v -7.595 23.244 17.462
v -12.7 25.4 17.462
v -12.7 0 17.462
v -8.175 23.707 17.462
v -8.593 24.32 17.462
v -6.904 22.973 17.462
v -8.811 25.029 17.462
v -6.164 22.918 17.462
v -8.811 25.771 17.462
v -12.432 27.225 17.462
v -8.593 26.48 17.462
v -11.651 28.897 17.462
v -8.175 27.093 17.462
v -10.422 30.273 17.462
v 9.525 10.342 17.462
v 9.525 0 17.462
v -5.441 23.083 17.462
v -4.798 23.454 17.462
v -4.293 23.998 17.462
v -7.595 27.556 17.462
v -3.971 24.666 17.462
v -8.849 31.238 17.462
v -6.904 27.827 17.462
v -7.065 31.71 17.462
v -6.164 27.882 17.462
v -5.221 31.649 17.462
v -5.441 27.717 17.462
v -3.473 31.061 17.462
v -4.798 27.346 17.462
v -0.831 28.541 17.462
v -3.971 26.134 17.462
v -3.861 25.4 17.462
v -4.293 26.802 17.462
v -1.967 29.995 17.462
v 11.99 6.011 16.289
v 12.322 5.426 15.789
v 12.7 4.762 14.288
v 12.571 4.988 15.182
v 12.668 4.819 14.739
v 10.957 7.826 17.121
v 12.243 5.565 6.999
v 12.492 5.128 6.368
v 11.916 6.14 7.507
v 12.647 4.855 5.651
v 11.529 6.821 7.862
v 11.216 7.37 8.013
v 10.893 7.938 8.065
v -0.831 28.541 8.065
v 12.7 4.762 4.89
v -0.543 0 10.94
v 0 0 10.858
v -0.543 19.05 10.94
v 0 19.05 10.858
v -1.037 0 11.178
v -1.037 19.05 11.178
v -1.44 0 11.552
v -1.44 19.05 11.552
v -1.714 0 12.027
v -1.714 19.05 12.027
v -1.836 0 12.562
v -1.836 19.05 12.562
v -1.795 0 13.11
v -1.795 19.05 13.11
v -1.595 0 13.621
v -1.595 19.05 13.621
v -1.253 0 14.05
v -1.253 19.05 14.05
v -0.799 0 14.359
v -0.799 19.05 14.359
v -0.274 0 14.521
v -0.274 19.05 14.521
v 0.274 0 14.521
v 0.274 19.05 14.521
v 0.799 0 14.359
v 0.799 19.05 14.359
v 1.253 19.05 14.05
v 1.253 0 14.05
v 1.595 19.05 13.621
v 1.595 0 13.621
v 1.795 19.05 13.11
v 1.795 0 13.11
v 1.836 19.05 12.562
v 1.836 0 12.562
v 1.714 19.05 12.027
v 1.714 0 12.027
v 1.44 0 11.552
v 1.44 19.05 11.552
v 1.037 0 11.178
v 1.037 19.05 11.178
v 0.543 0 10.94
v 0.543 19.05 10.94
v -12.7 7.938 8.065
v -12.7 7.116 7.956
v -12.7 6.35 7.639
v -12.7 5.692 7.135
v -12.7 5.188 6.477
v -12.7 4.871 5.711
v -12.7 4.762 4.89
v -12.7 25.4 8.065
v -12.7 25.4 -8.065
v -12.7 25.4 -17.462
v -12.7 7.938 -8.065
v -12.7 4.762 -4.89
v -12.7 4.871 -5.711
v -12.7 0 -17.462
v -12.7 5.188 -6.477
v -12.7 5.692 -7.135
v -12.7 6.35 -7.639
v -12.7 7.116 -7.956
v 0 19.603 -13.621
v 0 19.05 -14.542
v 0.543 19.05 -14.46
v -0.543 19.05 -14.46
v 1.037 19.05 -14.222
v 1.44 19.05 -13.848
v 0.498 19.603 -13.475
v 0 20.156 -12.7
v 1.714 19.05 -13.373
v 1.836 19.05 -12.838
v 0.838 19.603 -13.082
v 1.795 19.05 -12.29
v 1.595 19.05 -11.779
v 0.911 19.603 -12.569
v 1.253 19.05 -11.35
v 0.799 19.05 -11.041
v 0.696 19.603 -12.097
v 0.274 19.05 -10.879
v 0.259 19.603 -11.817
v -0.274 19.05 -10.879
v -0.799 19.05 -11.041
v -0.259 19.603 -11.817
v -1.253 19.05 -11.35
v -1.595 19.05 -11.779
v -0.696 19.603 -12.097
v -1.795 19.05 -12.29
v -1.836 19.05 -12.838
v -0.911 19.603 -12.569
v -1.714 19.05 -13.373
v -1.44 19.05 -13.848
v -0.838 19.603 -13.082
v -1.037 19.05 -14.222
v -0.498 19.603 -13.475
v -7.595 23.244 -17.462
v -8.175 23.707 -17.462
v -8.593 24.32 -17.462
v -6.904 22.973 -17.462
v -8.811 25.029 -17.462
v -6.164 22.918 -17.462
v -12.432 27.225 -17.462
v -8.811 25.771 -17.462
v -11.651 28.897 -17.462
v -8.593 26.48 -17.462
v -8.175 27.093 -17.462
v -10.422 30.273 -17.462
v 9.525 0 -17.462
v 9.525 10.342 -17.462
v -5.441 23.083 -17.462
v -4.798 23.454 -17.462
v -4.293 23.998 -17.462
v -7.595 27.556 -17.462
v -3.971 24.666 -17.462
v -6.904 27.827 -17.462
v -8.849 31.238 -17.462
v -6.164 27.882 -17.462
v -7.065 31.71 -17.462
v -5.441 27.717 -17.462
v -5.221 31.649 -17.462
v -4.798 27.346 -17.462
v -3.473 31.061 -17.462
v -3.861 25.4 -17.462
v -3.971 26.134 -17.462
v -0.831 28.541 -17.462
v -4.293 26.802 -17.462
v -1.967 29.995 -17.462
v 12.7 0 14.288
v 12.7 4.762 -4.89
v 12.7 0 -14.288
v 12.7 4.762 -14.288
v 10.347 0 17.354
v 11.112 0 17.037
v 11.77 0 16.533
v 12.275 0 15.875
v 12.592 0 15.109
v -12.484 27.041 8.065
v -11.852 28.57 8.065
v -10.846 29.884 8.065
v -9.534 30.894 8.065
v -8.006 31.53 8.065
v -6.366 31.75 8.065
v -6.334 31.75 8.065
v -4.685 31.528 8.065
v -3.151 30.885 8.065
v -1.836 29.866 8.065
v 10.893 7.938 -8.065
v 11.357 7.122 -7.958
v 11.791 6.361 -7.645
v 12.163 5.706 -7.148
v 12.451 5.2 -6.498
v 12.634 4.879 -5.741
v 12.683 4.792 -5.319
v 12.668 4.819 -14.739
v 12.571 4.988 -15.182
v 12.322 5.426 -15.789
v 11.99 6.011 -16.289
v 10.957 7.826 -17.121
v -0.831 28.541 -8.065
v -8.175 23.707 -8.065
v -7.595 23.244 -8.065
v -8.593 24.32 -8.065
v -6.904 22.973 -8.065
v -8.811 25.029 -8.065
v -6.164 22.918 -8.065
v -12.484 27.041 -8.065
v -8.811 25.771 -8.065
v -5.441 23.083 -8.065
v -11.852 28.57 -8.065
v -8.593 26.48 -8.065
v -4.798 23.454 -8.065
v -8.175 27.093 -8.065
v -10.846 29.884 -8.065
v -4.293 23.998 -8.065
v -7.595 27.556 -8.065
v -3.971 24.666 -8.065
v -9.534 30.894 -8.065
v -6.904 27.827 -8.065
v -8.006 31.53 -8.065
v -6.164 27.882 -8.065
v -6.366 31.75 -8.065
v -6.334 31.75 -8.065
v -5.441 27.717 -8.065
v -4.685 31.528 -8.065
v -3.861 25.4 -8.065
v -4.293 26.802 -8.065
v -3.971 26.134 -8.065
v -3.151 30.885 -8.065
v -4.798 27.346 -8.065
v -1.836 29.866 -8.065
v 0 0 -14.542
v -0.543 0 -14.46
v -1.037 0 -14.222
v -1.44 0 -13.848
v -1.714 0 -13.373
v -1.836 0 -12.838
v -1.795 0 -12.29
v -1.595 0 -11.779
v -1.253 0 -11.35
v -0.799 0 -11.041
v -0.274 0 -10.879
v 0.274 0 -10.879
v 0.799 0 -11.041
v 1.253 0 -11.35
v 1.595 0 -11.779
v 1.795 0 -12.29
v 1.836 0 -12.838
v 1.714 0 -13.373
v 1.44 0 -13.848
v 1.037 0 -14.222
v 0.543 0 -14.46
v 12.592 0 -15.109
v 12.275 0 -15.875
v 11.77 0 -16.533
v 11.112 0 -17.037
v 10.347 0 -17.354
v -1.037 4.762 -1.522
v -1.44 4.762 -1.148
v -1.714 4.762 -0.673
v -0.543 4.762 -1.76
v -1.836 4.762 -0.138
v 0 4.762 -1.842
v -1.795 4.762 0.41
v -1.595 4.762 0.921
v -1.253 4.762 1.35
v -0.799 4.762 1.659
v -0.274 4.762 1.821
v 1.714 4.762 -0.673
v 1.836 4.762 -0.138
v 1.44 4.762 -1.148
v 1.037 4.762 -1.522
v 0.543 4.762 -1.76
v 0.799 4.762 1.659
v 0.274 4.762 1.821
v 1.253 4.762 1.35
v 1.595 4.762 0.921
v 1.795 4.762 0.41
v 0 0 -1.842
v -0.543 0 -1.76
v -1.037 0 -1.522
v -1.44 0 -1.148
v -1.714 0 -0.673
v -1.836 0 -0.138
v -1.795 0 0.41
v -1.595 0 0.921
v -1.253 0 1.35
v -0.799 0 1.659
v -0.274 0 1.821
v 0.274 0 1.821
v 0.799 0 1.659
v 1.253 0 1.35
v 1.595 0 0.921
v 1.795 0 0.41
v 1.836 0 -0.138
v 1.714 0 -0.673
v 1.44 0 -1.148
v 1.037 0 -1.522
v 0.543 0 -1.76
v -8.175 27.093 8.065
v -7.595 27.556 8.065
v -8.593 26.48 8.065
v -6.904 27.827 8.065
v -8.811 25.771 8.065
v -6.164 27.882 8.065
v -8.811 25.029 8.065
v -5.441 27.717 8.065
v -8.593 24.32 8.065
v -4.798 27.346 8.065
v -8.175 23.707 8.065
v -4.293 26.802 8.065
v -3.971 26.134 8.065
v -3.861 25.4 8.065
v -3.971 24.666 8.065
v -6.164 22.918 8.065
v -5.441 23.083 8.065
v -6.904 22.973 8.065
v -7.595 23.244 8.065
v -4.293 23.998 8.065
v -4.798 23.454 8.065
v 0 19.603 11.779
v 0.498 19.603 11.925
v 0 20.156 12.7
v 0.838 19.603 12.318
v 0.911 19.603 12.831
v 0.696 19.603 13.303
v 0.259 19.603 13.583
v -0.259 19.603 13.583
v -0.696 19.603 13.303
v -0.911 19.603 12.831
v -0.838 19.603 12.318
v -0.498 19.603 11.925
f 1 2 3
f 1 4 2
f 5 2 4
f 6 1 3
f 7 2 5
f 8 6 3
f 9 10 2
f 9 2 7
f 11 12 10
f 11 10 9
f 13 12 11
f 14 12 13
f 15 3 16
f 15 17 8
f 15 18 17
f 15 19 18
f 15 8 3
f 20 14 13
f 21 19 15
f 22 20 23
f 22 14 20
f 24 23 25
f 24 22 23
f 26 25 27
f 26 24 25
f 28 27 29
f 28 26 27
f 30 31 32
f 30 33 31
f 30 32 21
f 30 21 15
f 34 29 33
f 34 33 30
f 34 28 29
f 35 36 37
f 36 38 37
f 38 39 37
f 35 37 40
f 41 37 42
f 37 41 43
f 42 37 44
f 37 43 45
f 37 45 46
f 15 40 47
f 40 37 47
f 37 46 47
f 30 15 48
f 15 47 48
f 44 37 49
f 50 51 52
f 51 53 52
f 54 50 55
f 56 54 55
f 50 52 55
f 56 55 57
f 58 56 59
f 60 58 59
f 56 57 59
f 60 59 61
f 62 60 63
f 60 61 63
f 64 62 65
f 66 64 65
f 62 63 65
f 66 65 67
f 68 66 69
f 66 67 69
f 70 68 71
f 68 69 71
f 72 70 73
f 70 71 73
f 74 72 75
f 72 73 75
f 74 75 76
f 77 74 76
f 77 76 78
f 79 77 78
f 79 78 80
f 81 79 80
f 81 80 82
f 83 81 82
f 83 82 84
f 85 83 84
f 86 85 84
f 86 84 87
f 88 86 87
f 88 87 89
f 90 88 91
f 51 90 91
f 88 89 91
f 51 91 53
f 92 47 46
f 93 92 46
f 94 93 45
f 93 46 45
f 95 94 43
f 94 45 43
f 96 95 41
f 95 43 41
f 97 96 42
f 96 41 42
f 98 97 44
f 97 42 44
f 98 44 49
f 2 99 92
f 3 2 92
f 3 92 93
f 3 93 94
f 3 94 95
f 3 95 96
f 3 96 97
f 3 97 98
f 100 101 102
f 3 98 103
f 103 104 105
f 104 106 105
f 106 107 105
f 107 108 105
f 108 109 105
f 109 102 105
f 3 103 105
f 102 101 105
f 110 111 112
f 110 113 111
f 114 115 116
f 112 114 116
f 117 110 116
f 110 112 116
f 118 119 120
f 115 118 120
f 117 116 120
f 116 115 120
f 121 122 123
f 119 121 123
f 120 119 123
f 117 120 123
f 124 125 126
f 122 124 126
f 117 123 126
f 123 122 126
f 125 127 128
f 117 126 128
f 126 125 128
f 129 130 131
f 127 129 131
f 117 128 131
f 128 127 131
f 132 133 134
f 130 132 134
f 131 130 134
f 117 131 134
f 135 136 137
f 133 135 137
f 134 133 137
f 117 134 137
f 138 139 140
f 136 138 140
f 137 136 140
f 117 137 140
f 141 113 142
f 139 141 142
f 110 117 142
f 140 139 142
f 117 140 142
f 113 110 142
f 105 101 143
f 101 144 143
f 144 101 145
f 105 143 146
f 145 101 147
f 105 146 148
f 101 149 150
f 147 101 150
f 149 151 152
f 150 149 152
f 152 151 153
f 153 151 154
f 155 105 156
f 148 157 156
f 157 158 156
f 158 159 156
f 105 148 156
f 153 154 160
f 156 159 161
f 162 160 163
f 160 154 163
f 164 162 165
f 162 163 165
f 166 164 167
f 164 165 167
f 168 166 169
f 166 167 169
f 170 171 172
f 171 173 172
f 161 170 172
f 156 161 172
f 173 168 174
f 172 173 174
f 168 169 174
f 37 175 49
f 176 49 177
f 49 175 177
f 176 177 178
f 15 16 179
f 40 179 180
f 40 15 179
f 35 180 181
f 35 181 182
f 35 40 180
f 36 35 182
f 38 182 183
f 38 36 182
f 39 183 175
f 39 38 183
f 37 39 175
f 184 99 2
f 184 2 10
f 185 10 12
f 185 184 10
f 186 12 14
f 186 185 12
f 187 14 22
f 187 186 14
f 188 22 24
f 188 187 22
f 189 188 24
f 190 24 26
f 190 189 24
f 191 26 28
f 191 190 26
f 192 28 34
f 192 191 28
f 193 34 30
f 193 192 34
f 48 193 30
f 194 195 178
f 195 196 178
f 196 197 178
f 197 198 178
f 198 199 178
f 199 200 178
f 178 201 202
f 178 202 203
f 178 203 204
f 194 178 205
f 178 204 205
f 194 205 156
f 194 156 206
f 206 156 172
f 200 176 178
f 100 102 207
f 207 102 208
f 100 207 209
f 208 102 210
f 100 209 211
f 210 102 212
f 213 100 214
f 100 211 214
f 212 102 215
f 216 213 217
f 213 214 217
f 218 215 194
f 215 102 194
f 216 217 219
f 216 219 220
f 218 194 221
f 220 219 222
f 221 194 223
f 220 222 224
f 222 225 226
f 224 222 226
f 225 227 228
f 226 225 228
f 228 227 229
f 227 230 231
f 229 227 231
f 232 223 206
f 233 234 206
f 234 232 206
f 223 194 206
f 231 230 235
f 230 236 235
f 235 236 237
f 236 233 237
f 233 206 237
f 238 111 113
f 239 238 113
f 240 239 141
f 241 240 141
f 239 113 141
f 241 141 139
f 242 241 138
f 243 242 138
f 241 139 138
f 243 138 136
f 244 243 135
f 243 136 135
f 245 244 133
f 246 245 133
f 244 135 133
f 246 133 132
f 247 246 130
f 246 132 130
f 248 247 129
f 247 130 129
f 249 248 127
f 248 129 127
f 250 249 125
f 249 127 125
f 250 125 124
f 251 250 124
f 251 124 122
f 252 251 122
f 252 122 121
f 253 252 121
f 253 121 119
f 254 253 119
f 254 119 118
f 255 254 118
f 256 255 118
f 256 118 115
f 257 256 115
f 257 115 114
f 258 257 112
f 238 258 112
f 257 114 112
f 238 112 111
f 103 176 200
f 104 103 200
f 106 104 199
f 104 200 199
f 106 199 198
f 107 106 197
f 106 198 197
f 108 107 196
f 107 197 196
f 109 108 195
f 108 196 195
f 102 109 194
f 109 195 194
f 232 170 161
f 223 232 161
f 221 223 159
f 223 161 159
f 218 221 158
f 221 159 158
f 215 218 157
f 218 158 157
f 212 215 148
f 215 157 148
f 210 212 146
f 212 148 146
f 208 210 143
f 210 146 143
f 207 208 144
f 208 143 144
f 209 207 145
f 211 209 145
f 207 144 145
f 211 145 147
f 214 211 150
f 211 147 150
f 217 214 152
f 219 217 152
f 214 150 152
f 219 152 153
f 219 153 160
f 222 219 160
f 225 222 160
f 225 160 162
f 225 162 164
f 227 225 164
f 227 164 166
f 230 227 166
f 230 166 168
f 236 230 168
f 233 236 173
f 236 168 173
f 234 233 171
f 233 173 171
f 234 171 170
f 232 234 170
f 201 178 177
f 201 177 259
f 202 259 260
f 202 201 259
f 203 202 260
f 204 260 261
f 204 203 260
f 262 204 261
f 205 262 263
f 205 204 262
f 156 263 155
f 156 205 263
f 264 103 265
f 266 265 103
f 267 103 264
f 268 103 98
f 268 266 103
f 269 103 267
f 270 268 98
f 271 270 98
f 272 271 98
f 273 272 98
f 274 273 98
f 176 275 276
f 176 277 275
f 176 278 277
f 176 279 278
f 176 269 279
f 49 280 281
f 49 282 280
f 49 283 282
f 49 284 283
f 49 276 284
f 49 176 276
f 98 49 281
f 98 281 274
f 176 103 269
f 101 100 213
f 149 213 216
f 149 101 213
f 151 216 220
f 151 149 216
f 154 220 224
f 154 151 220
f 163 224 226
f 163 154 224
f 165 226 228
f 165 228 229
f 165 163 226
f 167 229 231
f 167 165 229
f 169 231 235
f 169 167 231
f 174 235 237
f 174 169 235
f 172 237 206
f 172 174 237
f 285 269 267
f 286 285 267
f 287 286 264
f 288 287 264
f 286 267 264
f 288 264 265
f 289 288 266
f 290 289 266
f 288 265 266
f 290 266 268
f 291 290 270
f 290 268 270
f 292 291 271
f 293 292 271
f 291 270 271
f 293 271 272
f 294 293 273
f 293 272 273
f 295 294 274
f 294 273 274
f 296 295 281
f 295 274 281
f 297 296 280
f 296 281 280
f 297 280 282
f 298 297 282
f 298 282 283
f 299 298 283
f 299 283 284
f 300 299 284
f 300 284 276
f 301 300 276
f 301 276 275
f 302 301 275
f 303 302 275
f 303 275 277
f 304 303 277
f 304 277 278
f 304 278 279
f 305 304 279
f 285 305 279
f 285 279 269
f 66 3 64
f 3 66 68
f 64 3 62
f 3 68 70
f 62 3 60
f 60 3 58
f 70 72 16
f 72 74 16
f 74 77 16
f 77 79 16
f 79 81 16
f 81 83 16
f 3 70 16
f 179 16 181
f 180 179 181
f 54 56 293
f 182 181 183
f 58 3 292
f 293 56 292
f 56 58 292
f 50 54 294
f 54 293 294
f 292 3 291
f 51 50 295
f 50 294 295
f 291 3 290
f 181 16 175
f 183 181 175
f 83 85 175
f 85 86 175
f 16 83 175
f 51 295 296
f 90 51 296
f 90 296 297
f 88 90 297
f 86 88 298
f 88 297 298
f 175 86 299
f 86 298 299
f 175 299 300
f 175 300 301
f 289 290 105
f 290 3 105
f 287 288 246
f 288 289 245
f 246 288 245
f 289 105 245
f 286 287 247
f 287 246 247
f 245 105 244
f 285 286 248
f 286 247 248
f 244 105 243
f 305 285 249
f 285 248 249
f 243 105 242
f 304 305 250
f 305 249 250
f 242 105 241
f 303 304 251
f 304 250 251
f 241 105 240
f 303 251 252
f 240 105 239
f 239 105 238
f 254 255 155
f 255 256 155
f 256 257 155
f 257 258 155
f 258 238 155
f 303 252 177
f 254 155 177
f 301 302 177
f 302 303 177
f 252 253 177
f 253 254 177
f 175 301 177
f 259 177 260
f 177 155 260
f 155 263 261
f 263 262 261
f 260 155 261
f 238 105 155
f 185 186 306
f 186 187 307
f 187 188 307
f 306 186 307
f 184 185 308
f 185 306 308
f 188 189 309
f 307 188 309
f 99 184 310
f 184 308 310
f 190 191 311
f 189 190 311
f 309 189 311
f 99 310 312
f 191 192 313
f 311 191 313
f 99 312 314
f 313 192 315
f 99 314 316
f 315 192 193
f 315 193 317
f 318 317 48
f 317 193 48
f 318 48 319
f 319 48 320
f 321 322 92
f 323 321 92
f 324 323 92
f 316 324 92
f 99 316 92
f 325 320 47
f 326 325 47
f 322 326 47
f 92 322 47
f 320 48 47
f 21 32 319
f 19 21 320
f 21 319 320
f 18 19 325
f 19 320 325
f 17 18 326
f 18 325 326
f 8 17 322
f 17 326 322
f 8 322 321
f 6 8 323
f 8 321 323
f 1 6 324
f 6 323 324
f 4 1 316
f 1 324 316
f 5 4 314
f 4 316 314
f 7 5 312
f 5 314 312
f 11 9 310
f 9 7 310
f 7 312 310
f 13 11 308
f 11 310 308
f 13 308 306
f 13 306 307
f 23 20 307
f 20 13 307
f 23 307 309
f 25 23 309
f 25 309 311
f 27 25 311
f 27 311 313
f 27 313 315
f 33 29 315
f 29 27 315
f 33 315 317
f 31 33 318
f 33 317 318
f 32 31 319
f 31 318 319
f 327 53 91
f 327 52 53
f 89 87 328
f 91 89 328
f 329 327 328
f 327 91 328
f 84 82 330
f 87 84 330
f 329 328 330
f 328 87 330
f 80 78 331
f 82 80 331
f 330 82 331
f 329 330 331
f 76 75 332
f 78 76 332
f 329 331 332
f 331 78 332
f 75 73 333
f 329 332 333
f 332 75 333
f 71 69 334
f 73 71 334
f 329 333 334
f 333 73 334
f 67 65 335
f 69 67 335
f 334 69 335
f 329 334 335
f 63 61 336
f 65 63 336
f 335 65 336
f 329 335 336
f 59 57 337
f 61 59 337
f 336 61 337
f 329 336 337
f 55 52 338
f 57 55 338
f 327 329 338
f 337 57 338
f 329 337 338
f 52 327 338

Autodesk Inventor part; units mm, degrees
ref_plane "YZ Plane" through (0, 0, 0) normal (1, 0, 0) x (0, 1, 0)
ref_plane "XZ Plane" through (0, 0, 0) normal (0, 1, 0) x (-1, 0, 0)
ref_plane "XY Plane" through (0, 0, 0) normal (0, 0, 1) x (1, 0, 0)
sketch "Sketch1" plane through (0, 0, 0) normal (0, 0, 1) x (1, 0, 0)
  line L0 (-12.7, 0) -> (12.7, 0)
  line L1 (12.7, 0) -> (12.7, 4.7625)
  line L2 (12.7, 4.7625) -> (-0.831, 28.5406)
  line L3 (-12.7, 25.4) -> (-12.7, 0)
  arc A0 (-0.831, 28.5406) -> (-12.7, 25.4) centre (-6.35, 25.4) ccw
  circle A1 centre (-6.35, 25.4) radius 2.4892
  point P0 (0, 0)
  point P1 (0, 0)
  dimension "d0" = 25.4
  dimension "d1" = 6.35
  dimension "d2" = 4.7625
  dimension "d3" = 25.4
  dimension "d4" = 4.9784
extrude "Extrusion1" add sketch "Sketch1" along normal mid plane 34.925
sketch "Sketch2" plane through (12.7, 0, 17.4625) normal (1, 0, 0) x (0, 0, -1)
  line L0 (34.925, 4.7625) -> (0, 4.7625) projected
  line L1 (9.398, 31.75) -> (9.398, 7.9375)
  line L2 (12.573, 4.7625) -> (22.352, 4.7625)
  line L3 (25.527, 7.9375) -> (25.527, 31.75)
  arc A0 (9.398, 7.9375) -> (12.573, 4.7625) centre (12.573, 7.9375) ccw
  arc A1 (22.352, 4.7625) -> (25.527, 7.9375) centre (22.352, 7.9375) ccw
  line L4 (0, 0) -> (34.925, 0) construction
  line L5 (34.925, 31.75) -> (0, 31.75) projected
  point P0 (17.4625, 0)
  point P1 (17.4625, 4.7625)
  point P2 (17.4625, 0)
  point P3 (12.573, 4.7625)
  point P4 (22.352, 4.7625)
  dimension "d7" = 3.175
  dimension "d8" = 16.129
extrude "Extrusion2" cut sketch "Sketch2" against normal through all
chamfer "Chamfer2" [suppressed]
chamfer "Chamfer3" [suppressed]
fillet "Fillet1" radius 3.175 2 edges at (12.7, 2.3813, 17.4625) (12.7, 2.3813, -17.4625)
sketch "Sketch3" plane through (-12.7, 0, -17.4625) normal (0, -1, 0) x (1, 0, 0)
  line L0 (12.7, 30.1625) -> (12.7, 4.7625) construction
  point P0 (12.7, 17.4625)
  point P1 (12.7, 17.4625)
  point P2 (12.7, 17.4625)
  dimension "d12" = 25.4
  dimension "d37" = 38.1
  dimension "d38" = 25.4
  dimension "d32" = 25.4
  dimension "d33" = 25.4
  dimension "d34" = 50.8
hole "Hole1" at (0, 0, -12.7) at (0, 0, 12.7) at (0, 0, 0) direction (0, 1, 0) diameter 3.683 depth 19.05 tip angle 118 thread size "10-24 UNC" class "2B" standard "ANSI Unified Screw Threads"
pattern_linear "Rectangular Pattern1" [suppressed]
equation "\"d32\" = d33"
properties part number "Cascade Pulley Block2 (WCP-0298)" material "Aluminum 6061"
